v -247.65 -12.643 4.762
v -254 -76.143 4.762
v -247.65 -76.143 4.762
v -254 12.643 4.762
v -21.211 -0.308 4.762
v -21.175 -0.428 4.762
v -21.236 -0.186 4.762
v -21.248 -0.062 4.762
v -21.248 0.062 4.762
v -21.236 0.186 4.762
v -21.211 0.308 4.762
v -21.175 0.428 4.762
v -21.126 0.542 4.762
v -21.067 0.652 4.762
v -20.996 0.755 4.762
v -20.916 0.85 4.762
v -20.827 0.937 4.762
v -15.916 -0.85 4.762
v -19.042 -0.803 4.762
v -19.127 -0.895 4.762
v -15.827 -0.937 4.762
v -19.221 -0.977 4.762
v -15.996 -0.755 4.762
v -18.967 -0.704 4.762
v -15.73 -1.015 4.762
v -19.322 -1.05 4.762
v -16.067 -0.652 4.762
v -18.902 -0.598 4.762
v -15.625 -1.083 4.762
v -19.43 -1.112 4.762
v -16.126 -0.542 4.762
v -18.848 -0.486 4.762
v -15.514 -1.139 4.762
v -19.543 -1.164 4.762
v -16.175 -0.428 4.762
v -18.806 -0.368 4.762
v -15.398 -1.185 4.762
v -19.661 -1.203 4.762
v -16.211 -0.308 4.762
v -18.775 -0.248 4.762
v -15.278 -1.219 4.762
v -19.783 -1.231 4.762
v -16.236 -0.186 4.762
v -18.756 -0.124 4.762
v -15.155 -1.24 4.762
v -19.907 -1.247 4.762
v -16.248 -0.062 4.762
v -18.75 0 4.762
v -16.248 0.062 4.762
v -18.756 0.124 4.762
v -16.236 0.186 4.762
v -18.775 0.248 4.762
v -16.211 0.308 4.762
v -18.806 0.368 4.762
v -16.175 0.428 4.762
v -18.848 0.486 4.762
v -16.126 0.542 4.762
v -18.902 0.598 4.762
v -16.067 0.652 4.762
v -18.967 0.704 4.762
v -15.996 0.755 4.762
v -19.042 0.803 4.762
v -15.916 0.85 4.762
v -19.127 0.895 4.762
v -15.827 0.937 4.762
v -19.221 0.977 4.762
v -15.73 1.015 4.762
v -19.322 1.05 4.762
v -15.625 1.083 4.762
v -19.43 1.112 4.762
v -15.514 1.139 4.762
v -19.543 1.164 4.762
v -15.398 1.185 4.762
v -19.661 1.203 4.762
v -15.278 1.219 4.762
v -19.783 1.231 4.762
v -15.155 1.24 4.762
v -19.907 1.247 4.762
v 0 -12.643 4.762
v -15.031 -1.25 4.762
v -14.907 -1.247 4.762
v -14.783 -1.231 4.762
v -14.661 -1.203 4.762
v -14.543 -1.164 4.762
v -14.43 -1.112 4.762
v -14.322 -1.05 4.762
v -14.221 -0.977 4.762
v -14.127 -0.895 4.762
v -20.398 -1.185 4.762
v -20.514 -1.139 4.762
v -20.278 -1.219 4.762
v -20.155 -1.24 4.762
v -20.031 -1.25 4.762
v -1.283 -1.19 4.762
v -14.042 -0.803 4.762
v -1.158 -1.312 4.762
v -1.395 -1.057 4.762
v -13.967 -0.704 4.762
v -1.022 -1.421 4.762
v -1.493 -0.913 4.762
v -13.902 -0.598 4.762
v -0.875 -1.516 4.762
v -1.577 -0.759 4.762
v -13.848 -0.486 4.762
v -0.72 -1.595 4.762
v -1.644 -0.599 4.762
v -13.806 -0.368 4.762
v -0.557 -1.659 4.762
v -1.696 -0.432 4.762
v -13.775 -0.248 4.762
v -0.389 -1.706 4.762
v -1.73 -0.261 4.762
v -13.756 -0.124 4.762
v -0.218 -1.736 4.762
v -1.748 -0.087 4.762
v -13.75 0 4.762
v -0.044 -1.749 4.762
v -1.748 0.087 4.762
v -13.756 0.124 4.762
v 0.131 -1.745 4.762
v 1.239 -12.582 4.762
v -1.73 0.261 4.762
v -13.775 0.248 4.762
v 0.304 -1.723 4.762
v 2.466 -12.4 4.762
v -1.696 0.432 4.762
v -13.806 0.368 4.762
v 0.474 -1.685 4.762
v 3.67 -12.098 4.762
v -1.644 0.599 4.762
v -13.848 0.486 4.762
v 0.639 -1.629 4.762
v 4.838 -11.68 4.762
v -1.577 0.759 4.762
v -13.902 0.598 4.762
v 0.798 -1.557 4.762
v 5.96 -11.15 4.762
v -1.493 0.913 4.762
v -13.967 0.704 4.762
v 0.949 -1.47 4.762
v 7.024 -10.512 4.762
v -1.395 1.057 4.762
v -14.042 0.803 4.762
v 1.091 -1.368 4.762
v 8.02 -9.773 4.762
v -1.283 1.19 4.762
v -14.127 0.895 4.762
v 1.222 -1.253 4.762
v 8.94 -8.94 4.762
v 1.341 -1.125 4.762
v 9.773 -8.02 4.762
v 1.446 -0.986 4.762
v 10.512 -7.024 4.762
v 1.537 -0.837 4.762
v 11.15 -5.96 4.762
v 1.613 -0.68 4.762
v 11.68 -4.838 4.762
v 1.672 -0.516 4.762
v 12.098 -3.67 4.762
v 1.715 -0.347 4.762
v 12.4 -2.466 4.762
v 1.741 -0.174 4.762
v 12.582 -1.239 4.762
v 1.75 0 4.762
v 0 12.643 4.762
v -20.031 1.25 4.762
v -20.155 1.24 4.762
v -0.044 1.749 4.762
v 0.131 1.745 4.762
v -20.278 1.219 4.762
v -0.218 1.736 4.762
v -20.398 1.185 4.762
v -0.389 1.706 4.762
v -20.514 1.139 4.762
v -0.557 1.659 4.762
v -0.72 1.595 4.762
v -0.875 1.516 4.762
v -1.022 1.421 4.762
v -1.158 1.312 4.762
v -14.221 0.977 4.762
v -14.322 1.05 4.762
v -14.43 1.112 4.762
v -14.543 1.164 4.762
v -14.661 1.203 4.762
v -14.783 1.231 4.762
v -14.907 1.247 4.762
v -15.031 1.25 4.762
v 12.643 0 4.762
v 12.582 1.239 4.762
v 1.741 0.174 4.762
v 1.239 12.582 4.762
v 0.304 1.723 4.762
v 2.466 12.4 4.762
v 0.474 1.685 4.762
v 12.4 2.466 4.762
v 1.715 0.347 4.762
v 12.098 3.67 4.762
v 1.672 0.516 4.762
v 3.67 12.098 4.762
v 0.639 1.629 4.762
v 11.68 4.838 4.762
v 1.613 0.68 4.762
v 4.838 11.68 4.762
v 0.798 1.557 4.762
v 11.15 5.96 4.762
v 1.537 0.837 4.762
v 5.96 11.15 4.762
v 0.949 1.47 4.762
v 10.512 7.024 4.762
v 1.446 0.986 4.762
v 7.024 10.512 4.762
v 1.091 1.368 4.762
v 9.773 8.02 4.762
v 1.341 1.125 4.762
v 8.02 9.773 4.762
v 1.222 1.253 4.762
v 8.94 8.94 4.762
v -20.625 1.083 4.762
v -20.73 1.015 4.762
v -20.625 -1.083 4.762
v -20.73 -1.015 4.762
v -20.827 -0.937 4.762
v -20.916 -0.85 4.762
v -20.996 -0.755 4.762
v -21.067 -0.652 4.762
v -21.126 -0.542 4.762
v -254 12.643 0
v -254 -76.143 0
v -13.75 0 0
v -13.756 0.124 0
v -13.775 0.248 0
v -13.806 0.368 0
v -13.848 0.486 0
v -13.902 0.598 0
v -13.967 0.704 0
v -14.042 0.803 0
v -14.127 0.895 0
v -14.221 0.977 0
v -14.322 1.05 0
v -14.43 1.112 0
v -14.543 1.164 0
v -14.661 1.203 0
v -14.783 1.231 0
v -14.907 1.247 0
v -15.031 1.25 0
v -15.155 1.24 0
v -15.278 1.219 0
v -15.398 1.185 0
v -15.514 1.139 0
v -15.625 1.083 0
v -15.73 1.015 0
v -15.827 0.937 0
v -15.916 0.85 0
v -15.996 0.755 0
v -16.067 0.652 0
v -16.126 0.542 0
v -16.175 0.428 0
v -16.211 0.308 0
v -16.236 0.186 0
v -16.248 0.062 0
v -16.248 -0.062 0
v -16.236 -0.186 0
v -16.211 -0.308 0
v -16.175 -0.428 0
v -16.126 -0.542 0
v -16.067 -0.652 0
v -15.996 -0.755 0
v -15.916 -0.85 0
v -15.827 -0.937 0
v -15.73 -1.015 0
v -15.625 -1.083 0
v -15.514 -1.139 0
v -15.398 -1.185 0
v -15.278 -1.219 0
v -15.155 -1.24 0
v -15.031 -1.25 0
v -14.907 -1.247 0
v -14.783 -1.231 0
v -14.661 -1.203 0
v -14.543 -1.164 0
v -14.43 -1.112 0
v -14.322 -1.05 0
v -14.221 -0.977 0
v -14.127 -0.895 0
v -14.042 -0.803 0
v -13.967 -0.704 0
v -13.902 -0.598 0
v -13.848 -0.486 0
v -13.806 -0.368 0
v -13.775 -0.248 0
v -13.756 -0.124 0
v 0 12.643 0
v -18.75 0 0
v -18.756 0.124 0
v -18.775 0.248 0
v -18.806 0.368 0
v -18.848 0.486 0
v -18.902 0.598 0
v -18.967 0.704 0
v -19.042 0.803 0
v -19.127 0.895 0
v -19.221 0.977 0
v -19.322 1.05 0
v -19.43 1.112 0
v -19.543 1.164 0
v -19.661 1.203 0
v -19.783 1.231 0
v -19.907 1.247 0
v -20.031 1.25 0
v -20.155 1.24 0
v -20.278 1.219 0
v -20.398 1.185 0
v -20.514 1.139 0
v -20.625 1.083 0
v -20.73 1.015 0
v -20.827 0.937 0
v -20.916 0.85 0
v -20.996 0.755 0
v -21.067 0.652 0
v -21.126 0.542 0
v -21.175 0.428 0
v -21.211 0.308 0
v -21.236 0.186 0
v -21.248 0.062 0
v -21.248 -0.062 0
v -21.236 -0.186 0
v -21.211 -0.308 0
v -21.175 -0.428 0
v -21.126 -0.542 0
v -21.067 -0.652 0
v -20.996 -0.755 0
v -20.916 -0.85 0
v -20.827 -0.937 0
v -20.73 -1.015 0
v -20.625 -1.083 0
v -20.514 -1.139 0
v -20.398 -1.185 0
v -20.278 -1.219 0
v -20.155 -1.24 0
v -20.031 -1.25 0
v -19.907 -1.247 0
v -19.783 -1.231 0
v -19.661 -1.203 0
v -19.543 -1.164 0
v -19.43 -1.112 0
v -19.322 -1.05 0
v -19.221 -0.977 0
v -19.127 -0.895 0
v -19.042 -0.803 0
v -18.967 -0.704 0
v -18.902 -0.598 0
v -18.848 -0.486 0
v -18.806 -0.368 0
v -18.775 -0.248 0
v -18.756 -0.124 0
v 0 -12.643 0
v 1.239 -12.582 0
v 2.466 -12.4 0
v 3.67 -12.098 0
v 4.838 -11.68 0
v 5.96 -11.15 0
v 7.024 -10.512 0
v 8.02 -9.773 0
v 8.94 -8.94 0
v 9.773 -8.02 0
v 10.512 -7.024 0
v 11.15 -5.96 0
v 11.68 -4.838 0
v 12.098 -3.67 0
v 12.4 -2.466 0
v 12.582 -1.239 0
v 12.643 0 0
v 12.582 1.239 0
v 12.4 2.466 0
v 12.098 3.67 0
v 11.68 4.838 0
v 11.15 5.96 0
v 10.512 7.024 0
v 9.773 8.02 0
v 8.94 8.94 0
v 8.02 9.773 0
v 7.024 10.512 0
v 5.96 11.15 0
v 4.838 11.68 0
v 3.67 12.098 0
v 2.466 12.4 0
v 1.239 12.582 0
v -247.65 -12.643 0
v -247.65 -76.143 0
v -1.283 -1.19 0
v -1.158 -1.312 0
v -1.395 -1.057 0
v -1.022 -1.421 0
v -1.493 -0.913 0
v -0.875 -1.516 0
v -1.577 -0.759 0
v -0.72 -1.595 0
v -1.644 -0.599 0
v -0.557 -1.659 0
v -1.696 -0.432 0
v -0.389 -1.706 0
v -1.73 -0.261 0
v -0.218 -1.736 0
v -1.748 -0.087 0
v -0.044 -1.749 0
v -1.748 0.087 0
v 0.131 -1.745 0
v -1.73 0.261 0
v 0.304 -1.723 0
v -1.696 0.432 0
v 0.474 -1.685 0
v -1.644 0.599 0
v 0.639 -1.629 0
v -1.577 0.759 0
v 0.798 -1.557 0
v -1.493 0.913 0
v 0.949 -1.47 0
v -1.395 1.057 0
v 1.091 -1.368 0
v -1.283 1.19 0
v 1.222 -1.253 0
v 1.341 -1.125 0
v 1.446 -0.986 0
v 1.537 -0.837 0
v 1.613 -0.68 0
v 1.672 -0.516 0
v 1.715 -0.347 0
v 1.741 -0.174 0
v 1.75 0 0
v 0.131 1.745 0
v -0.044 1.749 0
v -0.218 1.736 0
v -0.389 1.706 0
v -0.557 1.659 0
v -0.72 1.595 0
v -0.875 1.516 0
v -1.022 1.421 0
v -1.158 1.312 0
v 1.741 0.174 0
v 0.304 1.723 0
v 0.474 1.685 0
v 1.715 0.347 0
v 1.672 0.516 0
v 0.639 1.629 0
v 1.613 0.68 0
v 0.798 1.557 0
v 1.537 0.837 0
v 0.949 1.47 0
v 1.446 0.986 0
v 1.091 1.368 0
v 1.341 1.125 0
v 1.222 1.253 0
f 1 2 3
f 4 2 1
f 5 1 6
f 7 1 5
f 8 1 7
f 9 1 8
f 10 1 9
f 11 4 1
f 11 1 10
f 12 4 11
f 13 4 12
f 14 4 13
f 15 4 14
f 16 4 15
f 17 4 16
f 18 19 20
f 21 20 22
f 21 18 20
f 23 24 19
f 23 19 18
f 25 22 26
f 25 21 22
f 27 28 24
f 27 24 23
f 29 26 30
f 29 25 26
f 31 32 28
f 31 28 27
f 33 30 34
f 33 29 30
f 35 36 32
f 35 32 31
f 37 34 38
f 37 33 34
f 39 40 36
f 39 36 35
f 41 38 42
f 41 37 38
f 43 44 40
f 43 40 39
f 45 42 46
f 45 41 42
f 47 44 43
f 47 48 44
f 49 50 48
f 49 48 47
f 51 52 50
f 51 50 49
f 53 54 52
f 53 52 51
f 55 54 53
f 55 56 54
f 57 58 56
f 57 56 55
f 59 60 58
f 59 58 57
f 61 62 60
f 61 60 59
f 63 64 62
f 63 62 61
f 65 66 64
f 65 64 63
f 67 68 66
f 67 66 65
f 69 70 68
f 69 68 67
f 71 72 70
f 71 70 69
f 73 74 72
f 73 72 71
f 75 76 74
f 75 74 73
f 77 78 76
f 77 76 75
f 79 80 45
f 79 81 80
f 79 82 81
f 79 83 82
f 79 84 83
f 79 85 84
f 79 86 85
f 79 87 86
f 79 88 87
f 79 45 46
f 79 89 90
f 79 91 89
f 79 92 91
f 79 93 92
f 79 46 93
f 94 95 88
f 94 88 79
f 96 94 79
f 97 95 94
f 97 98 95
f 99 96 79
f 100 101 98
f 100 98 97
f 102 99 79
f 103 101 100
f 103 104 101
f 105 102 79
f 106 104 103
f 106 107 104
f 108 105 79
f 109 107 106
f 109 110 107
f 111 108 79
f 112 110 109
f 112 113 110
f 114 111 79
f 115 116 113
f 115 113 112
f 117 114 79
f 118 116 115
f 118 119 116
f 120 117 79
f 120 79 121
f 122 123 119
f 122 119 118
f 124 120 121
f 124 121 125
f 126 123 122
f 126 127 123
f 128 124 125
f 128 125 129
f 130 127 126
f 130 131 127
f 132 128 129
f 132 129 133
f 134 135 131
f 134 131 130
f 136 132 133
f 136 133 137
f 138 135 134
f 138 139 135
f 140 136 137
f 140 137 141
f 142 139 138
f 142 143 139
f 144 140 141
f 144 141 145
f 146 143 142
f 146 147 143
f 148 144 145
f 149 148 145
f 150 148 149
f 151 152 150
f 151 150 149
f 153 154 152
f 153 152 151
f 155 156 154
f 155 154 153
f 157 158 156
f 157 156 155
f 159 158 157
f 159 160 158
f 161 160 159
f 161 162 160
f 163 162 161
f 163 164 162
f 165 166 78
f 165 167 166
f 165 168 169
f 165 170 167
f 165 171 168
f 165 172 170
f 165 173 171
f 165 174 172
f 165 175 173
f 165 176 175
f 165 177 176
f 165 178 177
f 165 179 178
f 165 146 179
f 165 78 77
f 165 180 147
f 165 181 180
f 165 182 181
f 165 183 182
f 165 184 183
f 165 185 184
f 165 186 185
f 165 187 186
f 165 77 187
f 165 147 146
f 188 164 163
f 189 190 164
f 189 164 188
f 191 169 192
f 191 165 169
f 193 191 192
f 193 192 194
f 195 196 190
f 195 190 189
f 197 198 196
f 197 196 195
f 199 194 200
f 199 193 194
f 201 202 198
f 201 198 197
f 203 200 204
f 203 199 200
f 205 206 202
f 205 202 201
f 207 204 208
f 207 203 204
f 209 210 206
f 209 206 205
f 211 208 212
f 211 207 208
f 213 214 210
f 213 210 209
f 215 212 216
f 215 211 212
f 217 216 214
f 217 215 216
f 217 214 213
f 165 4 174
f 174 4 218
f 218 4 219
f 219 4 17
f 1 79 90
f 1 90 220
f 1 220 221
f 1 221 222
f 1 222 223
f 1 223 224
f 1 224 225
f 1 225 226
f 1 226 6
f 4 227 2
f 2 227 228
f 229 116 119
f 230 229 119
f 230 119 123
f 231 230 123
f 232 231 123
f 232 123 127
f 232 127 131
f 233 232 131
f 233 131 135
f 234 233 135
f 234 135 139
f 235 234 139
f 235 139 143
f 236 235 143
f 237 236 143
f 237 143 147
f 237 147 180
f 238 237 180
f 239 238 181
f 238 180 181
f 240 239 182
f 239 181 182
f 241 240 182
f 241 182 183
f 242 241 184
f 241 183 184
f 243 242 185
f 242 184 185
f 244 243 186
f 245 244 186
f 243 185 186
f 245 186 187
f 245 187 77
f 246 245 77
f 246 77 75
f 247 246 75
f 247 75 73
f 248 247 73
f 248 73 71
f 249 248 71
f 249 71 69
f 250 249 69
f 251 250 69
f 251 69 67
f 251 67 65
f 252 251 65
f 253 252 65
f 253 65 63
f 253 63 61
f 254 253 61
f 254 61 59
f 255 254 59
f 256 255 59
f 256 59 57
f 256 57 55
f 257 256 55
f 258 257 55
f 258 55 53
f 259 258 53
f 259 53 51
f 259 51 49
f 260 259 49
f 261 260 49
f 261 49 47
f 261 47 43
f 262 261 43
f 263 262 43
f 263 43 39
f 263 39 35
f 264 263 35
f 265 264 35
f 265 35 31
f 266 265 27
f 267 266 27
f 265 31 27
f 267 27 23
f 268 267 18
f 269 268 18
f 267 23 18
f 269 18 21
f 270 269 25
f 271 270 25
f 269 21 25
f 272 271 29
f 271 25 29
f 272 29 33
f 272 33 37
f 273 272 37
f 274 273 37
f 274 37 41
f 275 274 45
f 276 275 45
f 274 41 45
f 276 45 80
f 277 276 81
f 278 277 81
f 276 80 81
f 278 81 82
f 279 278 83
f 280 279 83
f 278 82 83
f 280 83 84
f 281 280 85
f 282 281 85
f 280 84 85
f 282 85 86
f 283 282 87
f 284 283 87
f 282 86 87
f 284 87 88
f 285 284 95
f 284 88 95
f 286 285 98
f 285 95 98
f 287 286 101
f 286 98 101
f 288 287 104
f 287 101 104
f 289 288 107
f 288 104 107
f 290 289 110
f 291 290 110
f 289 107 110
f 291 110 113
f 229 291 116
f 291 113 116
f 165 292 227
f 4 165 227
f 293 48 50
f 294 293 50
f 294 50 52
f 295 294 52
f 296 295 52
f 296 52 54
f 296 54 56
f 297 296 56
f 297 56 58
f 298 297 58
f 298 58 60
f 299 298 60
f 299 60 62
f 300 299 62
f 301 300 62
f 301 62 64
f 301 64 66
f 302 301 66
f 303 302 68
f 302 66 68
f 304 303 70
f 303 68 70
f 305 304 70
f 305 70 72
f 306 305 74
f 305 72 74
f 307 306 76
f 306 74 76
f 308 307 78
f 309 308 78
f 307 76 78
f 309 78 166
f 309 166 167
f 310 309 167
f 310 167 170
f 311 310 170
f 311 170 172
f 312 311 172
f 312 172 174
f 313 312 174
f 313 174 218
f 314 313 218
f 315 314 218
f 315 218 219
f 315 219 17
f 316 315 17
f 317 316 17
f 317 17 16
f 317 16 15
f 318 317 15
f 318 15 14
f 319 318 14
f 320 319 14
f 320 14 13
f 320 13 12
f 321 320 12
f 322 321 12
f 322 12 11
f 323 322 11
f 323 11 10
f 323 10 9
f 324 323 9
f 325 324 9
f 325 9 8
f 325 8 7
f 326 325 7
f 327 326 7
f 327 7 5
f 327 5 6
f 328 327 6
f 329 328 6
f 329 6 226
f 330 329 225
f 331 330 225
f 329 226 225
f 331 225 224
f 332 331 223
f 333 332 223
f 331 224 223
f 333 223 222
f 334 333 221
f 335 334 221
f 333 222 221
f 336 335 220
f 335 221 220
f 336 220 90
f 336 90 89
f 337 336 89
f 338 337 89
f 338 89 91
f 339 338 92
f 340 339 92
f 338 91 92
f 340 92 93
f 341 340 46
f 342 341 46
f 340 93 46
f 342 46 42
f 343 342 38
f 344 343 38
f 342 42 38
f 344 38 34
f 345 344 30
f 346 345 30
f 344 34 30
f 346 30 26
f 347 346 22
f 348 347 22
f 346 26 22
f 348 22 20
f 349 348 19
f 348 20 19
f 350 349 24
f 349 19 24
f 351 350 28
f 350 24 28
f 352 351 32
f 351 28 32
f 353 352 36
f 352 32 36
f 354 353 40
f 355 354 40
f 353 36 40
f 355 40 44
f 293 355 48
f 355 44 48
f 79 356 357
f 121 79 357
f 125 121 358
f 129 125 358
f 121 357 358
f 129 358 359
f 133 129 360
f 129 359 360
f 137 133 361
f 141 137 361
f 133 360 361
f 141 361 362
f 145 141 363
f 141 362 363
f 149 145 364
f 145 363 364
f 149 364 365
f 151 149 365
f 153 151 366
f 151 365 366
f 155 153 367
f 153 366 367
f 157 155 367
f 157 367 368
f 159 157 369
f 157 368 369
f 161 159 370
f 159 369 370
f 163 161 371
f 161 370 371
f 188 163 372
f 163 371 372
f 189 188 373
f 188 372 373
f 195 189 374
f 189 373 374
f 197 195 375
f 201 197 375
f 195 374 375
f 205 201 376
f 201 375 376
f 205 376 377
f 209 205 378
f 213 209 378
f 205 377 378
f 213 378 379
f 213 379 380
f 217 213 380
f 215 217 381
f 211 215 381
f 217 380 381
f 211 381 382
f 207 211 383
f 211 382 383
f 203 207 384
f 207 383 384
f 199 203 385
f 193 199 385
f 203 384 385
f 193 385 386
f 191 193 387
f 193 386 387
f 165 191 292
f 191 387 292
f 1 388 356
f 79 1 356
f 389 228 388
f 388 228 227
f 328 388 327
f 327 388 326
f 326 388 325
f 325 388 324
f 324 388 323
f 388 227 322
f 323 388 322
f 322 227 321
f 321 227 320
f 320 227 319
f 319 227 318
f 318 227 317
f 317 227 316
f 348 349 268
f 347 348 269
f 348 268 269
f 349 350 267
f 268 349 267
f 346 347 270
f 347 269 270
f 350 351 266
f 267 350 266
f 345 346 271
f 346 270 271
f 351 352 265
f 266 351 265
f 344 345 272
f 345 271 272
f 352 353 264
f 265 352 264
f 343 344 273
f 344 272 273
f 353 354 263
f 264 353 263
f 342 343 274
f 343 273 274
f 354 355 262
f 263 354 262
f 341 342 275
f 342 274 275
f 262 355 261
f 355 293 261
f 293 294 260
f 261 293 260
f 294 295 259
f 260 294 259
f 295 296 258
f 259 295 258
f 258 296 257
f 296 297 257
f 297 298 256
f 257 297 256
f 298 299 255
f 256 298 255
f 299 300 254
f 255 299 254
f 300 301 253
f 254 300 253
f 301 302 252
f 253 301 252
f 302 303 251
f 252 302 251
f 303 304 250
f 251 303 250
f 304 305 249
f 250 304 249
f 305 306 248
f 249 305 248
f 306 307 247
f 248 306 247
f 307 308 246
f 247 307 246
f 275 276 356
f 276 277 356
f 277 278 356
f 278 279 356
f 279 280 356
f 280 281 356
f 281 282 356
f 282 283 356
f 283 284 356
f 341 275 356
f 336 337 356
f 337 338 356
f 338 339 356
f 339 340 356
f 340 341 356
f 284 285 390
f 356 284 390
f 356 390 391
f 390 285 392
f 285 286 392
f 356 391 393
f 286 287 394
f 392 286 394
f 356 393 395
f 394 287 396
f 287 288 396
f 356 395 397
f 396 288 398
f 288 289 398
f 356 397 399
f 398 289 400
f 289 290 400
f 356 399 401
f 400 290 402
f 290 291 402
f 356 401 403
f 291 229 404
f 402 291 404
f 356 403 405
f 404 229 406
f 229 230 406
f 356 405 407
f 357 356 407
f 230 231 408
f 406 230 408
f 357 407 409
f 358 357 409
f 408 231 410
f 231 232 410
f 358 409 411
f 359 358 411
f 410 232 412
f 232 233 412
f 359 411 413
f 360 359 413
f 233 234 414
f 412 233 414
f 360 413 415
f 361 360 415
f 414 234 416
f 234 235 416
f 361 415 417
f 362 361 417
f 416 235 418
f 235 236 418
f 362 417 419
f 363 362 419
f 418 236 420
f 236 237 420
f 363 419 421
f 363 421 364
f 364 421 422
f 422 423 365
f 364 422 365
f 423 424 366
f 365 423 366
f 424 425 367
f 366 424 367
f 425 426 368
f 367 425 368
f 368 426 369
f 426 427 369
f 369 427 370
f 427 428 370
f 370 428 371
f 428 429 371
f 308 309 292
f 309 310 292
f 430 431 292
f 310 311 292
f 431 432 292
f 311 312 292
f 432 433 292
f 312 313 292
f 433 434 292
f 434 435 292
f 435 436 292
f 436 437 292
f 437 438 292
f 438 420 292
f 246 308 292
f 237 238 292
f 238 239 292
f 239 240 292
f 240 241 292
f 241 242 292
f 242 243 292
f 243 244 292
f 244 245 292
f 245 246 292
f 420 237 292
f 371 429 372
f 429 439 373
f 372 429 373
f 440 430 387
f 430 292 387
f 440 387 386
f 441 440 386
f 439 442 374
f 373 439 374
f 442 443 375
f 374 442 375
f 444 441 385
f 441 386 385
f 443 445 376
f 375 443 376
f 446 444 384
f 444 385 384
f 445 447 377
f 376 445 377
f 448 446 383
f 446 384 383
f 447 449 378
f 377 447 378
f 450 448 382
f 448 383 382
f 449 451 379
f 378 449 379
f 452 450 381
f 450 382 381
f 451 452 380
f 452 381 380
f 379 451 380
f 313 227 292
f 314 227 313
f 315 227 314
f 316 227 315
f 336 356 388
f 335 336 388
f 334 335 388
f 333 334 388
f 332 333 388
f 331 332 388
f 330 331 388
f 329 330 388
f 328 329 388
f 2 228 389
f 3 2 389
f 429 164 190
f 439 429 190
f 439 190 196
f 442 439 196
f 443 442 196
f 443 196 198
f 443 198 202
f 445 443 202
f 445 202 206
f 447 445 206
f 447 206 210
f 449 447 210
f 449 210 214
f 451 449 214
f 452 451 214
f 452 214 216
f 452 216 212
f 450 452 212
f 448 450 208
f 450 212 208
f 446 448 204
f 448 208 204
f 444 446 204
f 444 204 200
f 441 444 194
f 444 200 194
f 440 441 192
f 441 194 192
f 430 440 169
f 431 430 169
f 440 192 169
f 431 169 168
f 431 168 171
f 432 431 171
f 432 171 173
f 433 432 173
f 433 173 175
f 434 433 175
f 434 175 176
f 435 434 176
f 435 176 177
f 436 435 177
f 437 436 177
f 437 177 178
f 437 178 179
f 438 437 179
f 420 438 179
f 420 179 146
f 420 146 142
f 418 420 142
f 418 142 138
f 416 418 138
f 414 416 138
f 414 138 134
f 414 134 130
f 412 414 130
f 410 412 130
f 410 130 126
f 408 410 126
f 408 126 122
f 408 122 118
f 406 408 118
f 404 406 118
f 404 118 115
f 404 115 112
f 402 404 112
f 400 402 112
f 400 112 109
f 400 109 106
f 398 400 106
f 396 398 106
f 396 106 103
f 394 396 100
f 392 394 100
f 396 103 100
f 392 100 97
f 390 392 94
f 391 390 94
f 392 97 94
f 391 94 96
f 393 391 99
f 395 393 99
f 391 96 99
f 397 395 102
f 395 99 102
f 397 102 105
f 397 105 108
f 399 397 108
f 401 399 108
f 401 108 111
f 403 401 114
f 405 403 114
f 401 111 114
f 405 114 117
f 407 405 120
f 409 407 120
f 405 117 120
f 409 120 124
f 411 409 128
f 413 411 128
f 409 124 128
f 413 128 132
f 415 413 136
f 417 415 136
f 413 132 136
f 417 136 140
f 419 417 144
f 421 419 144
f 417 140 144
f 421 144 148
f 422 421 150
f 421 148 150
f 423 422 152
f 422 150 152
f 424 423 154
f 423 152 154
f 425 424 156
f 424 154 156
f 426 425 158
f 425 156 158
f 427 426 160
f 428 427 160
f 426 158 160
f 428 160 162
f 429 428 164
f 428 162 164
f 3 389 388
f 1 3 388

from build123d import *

# Parameters (mm, degrees)
BOSS_EXTRUDE1_DEPTH = 4.7625
SKETCH3_R           = 1.25
CUT_EXTRUDE1_DEPTH  = 266.210067011
SKETCH4_R           = 1.75
CUT_EXTRUDE2_DEPTH  = 266.210067011


with BuildPart() as part:
    # Sketch1 → Boss-Extrude1 (new body)
    with BuildSketch(Plane.XY):
        with BuildLine():
            Line((0, 12.64261775), (-254, 12.64261775))
            Line((-254, 12.64261775), (-254, -12.64261775))
            Line((-254, -12.64261775), (-254, -76.14261775))
            Line((-254, -76.14261775), (-247.65, -76.14261775))
            Line((-247.65, -76.14261775), (-247.65, -12.64261775))
            Line((-247.65, -12.64261775), (0, -12.64261775))
            ThreePointArc((0, -12.64261775), (12.64261775, 0), (0, 12.64261775))
        make_face()
    extrude(amount=BOSS_EXTRUDE1_DEPTH)

    # Sketch3 → Cut-Extrude1 (cut, through all)
    with BuildSketch(Plane.XY.offset(4.7625)):
        with Locations((-15, 0)):
            Circle(SKETCH3_R)
        with Locations((-20, 0)):
            Circle(SKETCH3_R)
    extrude(amount=-CUT_EXTRUDE1_DEPTH, mode=Mode.SUBTRACT)

    # Sketch4 → Cut-Extrude2 (cut, through all)
    with BuildSketch(Plane.XY.offset(4.7625)):
        Circle(SKETCH4_R)
    extrude(amount=-CUT_EXTRUDE2_DEPTH, mode=Mode.SUBTRACT)


solid = part.part
